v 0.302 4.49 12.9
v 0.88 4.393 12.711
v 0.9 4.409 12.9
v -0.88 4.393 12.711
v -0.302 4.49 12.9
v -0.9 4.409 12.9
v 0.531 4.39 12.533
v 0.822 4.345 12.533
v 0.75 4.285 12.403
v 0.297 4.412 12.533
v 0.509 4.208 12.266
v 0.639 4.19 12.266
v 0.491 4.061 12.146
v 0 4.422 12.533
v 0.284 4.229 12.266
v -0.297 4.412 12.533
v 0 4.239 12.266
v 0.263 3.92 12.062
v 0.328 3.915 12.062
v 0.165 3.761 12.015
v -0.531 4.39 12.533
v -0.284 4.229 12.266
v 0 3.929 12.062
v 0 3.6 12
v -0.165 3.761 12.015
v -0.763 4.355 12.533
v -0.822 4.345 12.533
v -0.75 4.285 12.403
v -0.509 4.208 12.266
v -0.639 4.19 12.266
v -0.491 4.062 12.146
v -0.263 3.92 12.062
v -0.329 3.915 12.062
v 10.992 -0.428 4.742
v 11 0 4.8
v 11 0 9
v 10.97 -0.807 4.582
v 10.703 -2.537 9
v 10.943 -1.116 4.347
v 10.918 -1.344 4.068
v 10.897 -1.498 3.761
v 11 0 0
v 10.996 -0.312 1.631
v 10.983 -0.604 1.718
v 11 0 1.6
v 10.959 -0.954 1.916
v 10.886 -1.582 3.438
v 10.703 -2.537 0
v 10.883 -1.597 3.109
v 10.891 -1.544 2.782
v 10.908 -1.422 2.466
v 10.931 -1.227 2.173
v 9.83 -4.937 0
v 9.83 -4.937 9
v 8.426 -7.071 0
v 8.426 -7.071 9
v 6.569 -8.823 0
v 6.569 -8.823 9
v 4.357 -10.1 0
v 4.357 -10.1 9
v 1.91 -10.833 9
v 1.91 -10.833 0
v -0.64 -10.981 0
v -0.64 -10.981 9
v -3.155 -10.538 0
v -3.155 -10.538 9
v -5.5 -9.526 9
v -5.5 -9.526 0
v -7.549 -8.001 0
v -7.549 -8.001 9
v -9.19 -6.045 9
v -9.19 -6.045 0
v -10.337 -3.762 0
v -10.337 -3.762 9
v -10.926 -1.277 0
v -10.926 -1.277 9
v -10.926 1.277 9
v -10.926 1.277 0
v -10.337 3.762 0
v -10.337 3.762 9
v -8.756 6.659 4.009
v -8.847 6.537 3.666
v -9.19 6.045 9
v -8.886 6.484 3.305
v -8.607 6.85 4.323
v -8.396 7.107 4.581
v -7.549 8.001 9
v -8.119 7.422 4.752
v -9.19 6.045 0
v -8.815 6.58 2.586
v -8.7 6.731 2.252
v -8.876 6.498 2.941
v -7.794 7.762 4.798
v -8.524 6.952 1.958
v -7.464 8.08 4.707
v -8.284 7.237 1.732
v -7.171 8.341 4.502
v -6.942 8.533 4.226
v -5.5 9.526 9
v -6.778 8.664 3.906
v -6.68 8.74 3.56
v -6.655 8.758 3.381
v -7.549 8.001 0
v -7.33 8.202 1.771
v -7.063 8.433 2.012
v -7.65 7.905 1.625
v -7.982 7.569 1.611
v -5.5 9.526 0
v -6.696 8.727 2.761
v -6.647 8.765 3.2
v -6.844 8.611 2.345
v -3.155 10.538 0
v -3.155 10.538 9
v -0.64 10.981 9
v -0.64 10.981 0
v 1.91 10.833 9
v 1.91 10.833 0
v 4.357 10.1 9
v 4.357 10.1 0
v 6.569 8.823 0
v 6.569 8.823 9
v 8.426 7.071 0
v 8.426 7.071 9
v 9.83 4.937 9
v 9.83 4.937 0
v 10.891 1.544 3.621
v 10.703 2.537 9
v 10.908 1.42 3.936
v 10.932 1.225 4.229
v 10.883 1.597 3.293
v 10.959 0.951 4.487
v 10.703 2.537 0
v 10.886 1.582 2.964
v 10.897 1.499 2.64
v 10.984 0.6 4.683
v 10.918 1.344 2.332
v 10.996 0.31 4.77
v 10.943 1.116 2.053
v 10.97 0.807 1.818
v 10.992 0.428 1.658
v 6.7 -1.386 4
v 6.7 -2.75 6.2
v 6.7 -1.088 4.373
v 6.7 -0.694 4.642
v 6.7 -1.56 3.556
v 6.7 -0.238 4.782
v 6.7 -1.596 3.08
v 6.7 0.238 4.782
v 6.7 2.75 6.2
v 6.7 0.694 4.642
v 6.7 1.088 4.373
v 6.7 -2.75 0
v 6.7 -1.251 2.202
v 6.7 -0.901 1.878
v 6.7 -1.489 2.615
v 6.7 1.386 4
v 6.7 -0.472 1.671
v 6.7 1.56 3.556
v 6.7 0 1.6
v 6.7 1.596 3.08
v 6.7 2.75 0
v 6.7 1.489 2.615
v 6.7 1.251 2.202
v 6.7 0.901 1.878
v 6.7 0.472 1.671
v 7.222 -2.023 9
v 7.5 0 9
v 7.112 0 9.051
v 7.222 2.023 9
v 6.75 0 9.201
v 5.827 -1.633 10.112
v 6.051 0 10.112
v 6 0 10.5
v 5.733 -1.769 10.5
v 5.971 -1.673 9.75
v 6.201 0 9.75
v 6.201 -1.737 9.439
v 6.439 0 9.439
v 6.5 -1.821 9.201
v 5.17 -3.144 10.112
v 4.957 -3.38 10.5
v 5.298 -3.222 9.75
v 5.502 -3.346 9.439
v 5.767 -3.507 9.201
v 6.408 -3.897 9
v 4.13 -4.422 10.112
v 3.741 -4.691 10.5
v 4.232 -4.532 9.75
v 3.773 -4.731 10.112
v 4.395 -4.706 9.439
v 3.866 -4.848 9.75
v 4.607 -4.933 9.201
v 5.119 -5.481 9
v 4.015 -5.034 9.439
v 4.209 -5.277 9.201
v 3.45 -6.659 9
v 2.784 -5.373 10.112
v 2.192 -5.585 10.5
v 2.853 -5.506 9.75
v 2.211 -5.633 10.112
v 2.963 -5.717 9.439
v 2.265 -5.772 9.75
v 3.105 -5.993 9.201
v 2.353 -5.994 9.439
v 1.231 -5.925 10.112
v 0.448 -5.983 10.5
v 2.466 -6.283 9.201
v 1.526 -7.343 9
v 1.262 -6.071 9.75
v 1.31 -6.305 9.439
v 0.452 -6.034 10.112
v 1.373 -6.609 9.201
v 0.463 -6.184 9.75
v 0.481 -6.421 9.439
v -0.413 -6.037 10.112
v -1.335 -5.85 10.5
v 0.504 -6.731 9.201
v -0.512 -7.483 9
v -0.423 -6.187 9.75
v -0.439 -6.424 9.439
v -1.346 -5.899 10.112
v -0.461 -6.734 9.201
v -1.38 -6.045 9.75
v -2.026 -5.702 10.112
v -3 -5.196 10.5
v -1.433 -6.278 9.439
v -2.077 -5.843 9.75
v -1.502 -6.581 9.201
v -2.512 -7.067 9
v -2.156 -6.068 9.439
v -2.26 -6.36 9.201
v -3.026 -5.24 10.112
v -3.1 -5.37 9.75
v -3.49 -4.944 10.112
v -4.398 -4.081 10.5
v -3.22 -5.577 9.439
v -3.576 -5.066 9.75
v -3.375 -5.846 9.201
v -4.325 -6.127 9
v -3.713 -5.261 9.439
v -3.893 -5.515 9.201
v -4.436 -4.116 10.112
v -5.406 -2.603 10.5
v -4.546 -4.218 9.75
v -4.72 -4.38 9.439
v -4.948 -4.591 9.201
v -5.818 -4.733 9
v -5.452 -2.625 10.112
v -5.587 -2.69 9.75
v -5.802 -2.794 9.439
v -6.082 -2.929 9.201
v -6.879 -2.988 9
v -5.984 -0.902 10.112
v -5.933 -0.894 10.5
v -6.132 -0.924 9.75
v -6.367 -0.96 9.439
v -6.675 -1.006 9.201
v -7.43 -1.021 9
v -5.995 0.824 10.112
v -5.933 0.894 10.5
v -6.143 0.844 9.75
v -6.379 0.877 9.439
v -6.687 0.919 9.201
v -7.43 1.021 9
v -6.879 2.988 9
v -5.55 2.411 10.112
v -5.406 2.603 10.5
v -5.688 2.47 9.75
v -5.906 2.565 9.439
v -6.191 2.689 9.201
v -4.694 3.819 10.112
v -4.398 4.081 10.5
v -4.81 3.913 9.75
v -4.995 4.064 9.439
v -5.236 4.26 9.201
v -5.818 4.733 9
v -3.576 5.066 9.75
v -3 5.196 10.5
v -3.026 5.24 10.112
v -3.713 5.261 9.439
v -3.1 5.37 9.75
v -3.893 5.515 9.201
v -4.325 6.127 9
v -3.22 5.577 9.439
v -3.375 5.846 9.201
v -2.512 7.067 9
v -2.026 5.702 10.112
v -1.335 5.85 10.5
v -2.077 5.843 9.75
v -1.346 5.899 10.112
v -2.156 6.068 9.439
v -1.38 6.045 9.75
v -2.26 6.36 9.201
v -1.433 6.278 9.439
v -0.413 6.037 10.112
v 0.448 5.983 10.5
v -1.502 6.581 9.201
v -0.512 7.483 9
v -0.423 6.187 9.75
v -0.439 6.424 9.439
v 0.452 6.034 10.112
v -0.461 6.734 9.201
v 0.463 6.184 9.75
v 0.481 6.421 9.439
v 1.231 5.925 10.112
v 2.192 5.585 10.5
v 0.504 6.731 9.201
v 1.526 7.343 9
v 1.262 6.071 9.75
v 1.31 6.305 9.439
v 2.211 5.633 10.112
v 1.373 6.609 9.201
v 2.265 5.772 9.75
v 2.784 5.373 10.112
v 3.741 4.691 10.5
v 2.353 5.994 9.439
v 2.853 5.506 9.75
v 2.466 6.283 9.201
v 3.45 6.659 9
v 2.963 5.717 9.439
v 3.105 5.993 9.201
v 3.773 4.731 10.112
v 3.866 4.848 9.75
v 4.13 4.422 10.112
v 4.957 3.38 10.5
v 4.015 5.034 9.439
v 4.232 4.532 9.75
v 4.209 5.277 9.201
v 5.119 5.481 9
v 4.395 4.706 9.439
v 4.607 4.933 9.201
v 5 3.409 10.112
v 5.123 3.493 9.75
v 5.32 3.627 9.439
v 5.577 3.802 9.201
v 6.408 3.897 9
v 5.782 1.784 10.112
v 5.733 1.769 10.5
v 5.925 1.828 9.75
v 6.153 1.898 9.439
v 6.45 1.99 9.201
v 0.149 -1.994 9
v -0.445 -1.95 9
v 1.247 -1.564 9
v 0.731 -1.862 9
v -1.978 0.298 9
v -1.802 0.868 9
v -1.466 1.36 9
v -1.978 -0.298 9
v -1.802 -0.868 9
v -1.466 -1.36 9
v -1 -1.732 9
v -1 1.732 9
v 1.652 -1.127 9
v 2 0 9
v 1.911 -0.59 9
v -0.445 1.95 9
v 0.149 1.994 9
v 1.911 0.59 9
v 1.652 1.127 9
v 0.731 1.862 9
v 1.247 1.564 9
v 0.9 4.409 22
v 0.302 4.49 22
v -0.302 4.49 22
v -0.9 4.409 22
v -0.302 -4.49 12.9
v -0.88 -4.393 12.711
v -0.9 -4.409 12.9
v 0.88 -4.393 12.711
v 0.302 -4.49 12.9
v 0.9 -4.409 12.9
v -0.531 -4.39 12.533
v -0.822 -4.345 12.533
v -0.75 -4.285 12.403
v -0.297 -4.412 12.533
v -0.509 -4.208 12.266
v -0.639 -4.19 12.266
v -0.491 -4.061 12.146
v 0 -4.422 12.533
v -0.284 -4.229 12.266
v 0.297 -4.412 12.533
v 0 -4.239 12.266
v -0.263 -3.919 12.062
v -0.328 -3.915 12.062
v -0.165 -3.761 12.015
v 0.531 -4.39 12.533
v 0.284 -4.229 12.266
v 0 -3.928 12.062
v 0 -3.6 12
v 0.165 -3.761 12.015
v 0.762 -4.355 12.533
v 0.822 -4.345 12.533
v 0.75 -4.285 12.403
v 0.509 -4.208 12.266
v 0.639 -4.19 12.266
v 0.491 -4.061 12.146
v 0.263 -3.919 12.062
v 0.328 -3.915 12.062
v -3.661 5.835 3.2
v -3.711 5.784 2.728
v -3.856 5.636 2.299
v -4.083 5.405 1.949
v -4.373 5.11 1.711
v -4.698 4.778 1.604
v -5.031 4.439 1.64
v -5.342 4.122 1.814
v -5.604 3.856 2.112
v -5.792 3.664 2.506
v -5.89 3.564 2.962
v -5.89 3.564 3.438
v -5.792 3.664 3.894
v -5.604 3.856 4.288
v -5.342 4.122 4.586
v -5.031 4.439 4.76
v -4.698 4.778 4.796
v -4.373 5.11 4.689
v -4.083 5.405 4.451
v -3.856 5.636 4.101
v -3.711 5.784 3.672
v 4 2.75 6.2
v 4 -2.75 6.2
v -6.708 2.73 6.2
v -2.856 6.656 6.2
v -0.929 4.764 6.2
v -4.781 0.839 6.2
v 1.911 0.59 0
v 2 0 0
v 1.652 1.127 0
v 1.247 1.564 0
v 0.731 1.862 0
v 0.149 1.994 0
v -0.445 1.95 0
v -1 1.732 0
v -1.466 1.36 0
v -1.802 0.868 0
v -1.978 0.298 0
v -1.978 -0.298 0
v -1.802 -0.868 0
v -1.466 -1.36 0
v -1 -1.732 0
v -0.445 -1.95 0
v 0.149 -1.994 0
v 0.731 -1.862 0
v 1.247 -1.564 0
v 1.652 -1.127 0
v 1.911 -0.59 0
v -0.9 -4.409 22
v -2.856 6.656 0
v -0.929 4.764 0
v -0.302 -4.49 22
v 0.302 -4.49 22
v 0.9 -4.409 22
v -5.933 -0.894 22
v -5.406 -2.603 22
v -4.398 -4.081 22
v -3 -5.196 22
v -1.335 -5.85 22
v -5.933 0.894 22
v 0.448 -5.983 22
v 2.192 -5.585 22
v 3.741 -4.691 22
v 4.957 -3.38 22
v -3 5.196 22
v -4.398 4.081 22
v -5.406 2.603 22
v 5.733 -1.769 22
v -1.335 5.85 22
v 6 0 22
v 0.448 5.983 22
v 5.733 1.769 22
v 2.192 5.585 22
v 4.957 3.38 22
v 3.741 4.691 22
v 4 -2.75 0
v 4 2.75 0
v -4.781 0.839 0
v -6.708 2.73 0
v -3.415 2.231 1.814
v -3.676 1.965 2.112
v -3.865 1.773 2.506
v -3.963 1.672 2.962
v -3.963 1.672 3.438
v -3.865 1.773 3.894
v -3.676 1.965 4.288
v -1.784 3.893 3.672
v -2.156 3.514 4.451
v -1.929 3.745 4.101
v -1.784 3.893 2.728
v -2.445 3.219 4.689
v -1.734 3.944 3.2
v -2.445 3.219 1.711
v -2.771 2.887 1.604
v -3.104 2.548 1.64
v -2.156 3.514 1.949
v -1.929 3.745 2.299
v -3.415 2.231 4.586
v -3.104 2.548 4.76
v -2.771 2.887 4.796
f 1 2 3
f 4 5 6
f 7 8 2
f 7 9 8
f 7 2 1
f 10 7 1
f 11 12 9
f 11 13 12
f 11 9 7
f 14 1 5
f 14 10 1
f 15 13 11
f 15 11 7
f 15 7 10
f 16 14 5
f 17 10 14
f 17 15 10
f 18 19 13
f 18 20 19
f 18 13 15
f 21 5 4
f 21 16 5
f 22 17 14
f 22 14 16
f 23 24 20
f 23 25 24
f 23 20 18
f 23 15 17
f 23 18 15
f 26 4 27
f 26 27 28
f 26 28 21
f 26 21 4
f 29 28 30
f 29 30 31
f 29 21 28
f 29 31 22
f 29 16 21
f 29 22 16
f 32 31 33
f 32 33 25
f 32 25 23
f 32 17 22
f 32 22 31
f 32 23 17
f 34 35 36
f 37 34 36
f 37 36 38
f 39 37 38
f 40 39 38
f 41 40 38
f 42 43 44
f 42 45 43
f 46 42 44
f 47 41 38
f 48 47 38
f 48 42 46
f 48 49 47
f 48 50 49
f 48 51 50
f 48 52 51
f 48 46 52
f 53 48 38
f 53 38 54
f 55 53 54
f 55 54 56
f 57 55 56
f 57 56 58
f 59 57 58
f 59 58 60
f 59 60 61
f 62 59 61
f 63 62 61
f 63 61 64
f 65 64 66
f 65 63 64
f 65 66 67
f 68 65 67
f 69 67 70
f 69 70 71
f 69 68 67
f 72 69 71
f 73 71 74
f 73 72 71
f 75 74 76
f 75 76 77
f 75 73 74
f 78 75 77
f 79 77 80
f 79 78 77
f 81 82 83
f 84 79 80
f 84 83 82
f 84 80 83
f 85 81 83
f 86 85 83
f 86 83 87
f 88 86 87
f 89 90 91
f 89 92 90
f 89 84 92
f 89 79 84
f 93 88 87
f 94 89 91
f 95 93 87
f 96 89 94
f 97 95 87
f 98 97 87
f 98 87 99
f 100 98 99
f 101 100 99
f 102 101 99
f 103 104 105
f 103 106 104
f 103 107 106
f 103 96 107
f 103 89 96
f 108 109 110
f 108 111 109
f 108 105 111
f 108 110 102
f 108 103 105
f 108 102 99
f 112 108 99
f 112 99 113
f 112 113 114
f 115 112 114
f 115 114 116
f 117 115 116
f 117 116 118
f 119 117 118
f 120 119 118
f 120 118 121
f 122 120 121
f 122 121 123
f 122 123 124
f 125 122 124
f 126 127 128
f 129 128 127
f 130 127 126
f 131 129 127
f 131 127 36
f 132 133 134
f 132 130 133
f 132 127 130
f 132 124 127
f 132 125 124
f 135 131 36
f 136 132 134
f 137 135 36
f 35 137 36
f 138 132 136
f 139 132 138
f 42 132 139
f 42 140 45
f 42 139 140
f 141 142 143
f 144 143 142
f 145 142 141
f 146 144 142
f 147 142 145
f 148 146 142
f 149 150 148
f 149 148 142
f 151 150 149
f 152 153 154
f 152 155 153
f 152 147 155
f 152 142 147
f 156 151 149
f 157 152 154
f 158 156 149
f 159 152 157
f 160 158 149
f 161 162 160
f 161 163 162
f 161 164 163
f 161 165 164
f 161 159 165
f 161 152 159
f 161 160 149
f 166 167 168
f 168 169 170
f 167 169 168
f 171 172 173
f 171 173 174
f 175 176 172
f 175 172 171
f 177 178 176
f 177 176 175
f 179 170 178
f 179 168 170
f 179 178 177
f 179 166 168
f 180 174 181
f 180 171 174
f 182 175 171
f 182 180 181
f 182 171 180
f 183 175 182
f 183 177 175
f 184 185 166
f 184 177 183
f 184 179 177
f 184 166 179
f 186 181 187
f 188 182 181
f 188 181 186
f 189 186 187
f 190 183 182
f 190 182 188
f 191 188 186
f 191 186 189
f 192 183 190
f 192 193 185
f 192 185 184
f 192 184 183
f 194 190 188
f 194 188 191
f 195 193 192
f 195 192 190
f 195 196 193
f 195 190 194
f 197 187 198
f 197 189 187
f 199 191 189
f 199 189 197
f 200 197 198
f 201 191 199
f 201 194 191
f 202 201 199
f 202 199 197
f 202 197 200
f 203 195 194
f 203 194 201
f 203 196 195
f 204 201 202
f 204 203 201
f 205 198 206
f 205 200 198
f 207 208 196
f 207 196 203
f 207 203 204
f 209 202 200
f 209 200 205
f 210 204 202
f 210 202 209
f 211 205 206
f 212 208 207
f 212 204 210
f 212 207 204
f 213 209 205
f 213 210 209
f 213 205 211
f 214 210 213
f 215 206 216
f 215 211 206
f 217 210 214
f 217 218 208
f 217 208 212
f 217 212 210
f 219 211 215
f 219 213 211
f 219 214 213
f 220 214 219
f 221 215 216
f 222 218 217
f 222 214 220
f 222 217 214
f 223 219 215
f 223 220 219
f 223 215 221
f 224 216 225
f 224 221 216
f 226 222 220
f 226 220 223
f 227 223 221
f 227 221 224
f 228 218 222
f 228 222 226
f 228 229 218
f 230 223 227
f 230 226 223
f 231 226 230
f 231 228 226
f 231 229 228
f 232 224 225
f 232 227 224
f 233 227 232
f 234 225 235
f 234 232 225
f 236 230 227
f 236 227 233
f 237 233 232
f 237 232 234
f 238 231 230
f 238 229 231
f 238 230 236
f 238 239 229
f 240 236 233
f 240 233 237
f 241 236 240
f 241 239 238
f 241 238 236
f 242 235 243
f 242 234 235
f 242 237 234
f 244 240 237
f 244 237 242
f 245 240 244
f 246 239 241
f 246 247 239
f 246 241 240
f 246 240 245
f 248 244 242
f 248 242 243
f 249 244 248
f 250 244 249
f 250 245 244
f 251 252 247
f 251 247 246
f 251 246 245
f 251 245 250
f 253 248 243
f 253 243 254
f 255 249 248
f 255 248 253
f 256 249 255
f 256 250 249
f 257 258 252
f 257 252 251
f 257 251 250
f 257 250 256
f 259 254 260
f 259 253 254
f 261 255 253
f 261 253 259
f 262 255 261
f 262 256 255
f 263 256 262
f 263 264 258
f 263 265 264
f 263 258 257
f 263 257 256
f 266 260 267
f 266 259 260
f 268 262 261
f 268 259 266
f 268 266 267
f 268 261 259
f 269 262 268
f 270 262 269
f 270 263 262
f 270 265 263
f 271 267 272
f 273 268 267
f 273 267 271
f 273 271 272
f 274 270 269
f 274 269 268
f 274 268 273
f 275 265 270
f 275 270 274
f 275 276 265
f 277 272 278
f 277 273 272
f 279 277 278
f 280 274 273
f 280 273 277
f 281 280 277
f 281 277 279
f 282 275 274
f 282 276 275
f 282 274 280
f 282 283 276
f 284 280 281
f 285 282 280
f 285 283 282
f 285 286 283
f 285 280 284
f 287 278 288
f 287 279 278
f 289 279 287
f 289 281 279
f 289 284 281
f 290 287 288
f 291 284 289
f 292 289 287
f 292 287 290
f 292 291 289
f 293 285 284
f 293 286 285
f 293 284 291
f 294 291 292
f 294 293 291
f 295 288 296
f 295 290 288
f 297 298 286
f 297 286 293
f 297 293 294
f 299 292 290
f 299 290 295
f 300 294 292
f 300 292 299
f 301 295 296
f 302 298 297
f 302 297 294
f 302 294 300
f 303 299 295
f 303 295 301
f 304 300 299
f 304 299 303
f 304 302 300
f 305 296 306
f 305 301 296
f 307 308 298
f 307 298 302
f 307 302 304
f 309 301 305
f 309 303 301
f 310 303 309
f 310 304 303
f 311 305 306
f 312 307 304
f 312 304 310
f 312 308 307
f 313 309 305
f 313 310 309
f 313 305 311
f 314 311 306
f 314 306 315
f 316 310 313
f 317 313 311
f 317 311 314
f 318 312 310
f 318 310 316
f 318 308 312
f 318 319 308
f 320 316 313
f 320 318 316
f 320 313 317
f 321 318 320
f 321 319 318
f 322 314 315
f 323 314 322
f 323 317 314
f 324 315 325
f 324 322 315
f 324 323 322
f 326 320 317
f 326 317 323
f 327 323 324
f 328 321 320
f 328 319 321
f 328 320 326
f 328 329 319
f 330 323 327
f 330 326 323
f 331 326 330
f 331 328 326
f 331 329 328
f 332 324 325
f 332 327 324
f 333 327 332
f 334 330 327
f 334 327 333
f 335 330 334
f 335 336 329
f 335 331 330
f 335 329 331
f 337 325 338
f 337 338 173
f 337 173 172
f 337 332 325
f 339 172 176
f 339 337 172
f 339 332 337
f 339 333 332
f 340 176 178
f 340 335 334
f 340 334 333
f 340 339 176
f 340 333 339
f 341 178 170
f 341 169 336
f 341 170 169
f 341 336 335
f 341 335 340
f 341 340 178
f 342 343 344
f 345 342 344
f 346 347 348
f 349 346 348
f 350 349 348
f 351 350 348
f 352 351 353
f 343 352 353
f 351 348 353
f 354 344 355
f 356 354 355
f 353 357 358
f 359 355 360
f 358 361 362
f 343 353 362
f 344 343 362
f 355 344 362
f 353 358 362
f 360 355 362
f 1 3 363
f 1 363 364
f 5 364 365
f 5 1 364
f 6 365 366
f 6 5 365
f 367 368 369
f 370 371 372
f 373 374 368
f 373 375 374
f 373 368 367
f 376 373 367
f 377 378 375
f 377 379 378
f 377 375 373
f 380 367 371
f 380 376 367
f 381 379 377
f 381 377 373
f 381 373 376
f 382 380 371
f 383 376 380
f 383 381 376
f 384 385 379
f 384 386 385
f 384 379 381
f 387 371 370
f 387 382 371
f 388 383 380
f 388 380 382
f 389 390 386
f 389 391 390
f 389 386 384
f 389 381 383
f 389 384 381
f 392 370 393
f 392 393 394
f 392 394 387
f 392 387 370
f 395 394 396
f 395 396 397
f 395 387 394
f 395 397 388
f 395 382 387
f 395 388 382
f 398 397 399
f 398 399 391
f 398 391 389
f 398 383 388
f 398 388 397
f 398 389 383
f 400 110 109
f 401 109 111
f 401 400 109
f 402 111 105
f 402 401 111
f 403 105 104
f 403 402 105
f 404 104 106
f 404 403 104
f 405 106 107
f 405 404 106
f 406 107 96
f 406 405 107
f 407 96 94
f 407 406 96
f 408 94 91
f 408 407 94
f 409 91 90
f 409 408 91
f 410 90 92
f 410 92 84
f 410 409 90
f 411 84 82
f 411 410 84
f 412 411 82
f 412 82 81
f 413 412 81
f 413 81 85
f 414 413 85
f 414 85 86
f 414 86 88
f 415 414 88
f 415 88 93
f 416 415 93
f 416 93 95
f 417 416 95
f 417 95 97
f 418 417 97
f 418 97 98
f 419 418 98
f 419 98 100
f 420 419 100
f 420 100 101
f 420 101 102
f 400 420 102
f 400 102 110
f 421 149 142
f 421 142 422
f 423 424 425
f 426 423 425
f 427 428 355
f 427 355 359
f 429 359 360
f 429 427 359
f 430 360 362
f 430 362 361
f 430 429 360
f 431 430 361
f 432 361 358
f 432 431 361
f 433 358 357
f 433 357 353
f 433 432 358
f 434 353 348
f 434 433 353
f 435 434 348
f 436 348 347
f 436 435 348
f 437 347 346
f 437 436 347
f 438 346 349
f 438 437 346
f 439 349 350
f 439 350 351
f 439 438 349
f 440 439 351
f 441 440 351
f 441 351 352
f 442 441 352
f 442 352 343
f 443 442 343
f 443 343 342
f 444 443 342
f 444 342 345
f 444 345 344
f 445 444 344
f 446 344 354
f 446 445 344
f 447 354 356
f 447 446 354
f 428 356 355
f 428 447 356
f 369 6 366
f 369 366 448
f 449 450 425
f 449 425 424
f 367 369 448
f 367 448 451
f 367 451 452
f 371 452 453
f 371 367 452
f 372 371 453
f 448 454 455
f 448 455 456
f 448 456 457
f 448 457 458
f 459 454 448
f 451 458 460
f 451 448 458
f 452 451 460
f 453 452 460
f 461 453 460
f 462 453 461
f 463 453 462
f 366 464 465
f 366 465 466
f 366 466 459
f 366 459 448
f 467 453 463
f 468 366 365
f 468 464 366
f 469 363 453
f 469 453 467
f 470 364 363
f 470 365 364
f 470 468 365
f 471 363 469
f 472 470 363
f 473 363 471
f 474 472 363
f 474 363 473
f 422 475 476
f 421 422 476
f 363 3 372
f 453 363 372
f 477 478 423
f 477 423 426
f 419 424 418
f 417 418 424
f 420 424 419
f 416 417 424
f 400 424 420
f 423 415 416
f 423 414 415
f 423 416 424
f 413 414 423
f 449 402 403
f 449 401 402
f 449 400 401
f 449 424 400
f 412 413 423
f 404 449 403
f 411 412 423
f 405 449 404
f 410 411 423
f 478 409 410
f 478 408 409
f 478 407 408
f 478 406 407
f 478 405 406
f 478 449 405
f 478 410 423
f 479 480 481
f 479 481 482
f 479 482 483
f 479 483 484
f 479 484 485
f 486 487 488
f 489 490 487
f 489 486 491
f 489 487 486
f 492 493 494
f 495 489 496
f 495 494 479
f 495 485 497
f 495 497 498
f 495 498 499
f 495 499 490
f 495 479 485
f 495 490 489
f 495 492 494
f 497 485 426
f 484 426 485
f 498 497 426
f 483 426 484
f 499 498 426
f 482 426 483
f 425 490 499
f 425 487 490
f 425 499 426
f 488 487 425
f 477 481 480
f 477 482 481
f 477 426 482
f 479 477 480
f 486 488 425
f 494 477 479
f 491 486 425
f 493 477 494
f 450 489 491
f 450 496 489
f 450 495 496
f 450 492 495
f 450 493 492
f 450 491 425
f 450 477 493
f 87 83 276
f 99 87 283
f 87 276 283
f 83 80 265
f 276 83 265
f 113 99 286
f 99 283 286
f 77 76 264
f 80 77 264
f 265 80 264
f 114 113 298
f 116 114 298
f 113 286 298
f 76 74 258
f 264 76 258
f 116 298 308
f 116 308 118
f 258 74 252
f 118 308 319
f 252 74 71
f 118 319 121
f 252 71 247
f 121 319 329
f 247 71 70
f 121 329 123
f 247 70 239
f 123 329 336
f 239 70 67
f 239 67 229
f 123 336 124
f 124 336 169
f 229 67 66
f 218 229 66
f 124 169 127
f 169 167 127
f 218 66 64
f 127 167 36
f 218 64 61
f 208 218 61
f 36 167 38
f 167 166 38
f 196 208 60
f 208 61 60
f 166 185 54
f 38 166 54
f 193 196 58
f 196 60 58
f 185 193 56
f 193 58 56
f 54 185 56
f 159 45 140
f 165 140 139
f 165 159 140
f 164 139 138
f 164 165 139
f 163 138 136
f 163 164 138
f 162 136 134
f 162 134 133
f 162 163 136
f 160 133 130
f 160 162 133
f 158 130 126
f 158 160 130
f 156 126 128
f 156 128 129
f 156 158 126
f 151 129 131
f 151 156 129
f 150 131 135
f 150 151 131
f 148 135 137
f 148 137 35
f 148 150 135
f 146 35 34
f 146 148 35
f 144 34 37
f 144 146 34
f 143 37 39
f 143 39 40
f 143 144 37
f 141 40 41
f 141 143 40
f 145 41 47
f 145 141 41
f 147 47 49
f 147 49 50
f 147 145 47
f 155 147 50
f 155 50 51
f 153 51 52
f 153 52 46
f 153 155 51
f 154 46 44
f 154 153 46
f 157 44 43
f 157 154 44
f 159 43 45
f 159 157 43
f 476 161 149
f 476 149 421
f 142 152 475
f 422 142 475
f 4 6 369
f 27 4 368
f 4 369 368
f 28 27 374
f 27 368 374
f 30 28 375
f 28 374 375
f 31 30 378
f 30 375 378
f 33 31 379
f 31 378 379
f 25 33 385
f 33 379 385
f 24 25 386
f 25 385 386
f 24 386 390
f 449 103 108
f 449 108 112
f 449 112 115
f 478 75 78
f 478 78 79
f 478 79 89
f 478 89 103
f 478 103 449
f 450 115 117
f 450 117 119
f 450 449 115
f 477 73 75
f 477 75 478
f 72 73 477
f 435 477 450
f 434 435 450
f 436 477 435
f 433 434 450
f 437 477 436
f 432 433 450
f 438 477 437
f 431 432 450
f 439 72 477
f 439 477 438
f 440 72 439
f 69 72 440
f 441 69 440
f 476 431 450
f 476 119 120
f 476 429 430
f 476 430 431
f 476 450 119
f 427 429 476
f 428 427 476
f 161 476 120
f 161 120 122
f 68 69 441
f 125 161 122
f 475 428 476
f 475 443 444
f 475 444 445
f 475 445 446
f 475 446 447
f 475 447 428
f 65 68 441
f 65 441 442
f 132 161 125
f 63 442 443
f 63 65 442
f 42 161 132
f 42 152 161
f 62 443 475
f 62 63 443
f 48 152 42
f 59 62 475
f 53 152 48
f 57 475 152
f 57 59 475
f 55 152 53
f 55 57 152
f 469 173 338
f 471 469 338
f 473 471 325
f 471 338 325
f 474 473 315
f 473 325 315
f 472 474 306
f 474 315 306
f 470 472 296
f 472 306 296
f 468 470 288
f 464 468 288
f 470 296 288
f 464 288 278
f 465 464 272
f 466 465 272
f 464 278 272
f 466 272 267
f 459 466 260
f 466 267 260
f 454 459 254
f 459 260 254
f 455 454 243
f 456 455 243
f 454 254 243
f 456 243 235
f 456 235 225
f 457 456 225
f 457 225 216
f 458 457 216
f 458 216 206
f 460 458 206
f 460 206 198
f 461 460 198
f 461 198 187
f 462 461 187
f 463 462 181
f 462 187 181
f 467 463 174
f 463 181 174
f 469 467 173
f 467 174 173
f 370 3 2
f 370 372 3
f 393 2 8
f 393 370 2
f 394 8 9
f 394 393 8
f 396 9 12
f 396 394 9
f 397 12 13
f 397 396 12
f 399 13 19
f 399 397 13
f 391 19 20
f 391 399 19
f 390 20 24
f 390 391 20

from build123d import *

# Parameters (mm, degrees)
SKETCH1_R           = 6
SKETCH1_R_2         = 2
BOSS_EXTRUDE1_DEPTH = 9
SKETCH2_R           = 6
BOSS_EXTRUDE2_DEPTH = 3
BOSS_EXTRUDE3_DEPTH = 10
SKETCH4_R           = 6
SKETCH4_R_2         = 4.5
BOSS_EXTRUDE4_DEPTH = 10
BOSS_EXTRUDE5_START = 9
SKETCH5_R           = 11
SKETCH5_R_2         = 6
BOSS_EXTRUDE5_DEPTH = 9
SKETCH6_W           = 2.7
SKETCH6_H           = 5.5
CUT_EXTRUDE1_DEPTH  = 6.2
SKETCH7_R           = 1.6
CUT_EXTRUDE2_DEPTH  = 29.809720582
SKETCH8_R           = 1.6
CUT_EXTRUDE3_DEPTH  = 30.43544272
FILLET1_R           = 0.9
FILLET2_R           = 1.5


with BuildPart() as part:
    # Sketch1 → Boss-Extrude1 (new body)
    with BuildSketch(Plane.XY):
        Circle(SKETCH1_R)
        Circle(SKETCH1_R_2, mode=Mode.SUBTRACT)
    extrude(amount=BOSS_EXTRUDE1_DEPTH)

    # Sketch2 → Boss-Extrude2 (add)
    with BuildSketch(Plane.XY.offset(9)):
        Circle(SKETCH2_R)
    extrude(amount=BOSS_EXTRUDE2_DEPTH)

    # Sketch3 → Boss-Extrude3 (add)
    with BuildSketch(Plane.XY.offset(12)):
        with BuildLine():
            Line((0.9, 4.409081537), (0.9, -4.409081537))
            ThreePointArc((0.9, -4.409081537), (4.5, 0), (0.9, 4.409081537))
        make_face()
        with BuildLine():
            Line((-0.9, 4.409081537), (-0.9, -4.409081537))
            ThreePointArc((-0.9, -4.409081537), (-4.5, 0), (-0.9, 4.409081537))
        make_face()
    extrude(amount=BOSS_EXTRUDE3_DEPTH)

    # Sketch4 → Boss-Extrude4 (add)
    with BuildSketch(Plane.XY.offset(12)):
        Circle(SKETCH4_R)
        Circle(SKETCH4_R_2, mode=Mode.SUBTRACT)
    extrude(amount=BOSS_EXTRUDE4_DEPTH)

    # Sketch5 → Boss-Extrude5 (add)
    with BuildSketch(Plane(origin=(0, 0, 9), x_dir=(-1, 0, 0), z_dir=(0, 0, -1)).offset(BOSS_EXTRUDE5_START)):
        with Locations(Location((0, 0, 0), (0, 0, 180))):
            Circle(SKETCH5_R)
        Circle(SKETCH5_R_2, mode=Mode.SUBTRACT)
    extrude(amount=-BOSS_EXTRUDE5_DEPTH)

    # Sketch6 → Cut-Extrude1 (cut)
    with BuildSketch(Plane(origin=(0, 0, 0), x_dir=(-1, 0, 0), z_dir=(0, 0, -1))):
        with Locations((-5.35, 0)):
            Rectangle(SKETCH6_W, SKETCH6_H)
        Polygon((2.855831889, 6.655578529), (6.708147842, 2.730064321), (4.781077231, 0.838927398), (0.928761278, 4.764441606), align=None)
    extrude(amount=-CUT_EXTRUDE1_DEPTH, mode=Mode.SUBTRACT)

    # Sketch7 → Cut-Extrude2 (cut, through all)
    with BuildSketch(Plane(origin=(4, 0, 0), x_dir=(0, 0, -1), z_dir=(1, 0, 0))):
        with Locations((-3.2, 0)):
            Circle(SKETCH7_R)
    extrude(amount=CUT_EXTRUDE2_DEPTH, mode=Mode.SUBTRACT)

    # Sketch8 → Cut-Extrude3 (cut, through all)
    with BuildSketch(Plane(origin=(-2.854919424, 2.80168433, 0), x_dir=(0, 0, 1), z_dir=(-0.7137298559492212, 0.7004210824402017, 0))):
        with Locations(Location((3.2, 0, 0), (0, 0, 90))):
            Circle(SKETCH8_R)
    extrude(amount=CUT_EXTRUDE3_DEPTH, mode=Mode.SUBTRACT)

    # Fillet1
    fillet1_edges = [part.edges().sort_by_distance(p)[0] for p in [
        (0.9, 0, 12),
        (-0.9, 0, 12),
        (0, 4.5, 12),
        (0, -4.5, 12),
    ]]
    fillet(fillet1_edges, radius=FILLET1_R - 0.0001)  # a hair under: the kernel refuses the full size

    # Fillet2
    fillet2_edges = [part.edges().sort_by_distance(p)[0] for p in [
        (-6, 0, 9),
    ]]
    fillet(fillet2_edges, radius=FILLET2_R)


solid = part.part
